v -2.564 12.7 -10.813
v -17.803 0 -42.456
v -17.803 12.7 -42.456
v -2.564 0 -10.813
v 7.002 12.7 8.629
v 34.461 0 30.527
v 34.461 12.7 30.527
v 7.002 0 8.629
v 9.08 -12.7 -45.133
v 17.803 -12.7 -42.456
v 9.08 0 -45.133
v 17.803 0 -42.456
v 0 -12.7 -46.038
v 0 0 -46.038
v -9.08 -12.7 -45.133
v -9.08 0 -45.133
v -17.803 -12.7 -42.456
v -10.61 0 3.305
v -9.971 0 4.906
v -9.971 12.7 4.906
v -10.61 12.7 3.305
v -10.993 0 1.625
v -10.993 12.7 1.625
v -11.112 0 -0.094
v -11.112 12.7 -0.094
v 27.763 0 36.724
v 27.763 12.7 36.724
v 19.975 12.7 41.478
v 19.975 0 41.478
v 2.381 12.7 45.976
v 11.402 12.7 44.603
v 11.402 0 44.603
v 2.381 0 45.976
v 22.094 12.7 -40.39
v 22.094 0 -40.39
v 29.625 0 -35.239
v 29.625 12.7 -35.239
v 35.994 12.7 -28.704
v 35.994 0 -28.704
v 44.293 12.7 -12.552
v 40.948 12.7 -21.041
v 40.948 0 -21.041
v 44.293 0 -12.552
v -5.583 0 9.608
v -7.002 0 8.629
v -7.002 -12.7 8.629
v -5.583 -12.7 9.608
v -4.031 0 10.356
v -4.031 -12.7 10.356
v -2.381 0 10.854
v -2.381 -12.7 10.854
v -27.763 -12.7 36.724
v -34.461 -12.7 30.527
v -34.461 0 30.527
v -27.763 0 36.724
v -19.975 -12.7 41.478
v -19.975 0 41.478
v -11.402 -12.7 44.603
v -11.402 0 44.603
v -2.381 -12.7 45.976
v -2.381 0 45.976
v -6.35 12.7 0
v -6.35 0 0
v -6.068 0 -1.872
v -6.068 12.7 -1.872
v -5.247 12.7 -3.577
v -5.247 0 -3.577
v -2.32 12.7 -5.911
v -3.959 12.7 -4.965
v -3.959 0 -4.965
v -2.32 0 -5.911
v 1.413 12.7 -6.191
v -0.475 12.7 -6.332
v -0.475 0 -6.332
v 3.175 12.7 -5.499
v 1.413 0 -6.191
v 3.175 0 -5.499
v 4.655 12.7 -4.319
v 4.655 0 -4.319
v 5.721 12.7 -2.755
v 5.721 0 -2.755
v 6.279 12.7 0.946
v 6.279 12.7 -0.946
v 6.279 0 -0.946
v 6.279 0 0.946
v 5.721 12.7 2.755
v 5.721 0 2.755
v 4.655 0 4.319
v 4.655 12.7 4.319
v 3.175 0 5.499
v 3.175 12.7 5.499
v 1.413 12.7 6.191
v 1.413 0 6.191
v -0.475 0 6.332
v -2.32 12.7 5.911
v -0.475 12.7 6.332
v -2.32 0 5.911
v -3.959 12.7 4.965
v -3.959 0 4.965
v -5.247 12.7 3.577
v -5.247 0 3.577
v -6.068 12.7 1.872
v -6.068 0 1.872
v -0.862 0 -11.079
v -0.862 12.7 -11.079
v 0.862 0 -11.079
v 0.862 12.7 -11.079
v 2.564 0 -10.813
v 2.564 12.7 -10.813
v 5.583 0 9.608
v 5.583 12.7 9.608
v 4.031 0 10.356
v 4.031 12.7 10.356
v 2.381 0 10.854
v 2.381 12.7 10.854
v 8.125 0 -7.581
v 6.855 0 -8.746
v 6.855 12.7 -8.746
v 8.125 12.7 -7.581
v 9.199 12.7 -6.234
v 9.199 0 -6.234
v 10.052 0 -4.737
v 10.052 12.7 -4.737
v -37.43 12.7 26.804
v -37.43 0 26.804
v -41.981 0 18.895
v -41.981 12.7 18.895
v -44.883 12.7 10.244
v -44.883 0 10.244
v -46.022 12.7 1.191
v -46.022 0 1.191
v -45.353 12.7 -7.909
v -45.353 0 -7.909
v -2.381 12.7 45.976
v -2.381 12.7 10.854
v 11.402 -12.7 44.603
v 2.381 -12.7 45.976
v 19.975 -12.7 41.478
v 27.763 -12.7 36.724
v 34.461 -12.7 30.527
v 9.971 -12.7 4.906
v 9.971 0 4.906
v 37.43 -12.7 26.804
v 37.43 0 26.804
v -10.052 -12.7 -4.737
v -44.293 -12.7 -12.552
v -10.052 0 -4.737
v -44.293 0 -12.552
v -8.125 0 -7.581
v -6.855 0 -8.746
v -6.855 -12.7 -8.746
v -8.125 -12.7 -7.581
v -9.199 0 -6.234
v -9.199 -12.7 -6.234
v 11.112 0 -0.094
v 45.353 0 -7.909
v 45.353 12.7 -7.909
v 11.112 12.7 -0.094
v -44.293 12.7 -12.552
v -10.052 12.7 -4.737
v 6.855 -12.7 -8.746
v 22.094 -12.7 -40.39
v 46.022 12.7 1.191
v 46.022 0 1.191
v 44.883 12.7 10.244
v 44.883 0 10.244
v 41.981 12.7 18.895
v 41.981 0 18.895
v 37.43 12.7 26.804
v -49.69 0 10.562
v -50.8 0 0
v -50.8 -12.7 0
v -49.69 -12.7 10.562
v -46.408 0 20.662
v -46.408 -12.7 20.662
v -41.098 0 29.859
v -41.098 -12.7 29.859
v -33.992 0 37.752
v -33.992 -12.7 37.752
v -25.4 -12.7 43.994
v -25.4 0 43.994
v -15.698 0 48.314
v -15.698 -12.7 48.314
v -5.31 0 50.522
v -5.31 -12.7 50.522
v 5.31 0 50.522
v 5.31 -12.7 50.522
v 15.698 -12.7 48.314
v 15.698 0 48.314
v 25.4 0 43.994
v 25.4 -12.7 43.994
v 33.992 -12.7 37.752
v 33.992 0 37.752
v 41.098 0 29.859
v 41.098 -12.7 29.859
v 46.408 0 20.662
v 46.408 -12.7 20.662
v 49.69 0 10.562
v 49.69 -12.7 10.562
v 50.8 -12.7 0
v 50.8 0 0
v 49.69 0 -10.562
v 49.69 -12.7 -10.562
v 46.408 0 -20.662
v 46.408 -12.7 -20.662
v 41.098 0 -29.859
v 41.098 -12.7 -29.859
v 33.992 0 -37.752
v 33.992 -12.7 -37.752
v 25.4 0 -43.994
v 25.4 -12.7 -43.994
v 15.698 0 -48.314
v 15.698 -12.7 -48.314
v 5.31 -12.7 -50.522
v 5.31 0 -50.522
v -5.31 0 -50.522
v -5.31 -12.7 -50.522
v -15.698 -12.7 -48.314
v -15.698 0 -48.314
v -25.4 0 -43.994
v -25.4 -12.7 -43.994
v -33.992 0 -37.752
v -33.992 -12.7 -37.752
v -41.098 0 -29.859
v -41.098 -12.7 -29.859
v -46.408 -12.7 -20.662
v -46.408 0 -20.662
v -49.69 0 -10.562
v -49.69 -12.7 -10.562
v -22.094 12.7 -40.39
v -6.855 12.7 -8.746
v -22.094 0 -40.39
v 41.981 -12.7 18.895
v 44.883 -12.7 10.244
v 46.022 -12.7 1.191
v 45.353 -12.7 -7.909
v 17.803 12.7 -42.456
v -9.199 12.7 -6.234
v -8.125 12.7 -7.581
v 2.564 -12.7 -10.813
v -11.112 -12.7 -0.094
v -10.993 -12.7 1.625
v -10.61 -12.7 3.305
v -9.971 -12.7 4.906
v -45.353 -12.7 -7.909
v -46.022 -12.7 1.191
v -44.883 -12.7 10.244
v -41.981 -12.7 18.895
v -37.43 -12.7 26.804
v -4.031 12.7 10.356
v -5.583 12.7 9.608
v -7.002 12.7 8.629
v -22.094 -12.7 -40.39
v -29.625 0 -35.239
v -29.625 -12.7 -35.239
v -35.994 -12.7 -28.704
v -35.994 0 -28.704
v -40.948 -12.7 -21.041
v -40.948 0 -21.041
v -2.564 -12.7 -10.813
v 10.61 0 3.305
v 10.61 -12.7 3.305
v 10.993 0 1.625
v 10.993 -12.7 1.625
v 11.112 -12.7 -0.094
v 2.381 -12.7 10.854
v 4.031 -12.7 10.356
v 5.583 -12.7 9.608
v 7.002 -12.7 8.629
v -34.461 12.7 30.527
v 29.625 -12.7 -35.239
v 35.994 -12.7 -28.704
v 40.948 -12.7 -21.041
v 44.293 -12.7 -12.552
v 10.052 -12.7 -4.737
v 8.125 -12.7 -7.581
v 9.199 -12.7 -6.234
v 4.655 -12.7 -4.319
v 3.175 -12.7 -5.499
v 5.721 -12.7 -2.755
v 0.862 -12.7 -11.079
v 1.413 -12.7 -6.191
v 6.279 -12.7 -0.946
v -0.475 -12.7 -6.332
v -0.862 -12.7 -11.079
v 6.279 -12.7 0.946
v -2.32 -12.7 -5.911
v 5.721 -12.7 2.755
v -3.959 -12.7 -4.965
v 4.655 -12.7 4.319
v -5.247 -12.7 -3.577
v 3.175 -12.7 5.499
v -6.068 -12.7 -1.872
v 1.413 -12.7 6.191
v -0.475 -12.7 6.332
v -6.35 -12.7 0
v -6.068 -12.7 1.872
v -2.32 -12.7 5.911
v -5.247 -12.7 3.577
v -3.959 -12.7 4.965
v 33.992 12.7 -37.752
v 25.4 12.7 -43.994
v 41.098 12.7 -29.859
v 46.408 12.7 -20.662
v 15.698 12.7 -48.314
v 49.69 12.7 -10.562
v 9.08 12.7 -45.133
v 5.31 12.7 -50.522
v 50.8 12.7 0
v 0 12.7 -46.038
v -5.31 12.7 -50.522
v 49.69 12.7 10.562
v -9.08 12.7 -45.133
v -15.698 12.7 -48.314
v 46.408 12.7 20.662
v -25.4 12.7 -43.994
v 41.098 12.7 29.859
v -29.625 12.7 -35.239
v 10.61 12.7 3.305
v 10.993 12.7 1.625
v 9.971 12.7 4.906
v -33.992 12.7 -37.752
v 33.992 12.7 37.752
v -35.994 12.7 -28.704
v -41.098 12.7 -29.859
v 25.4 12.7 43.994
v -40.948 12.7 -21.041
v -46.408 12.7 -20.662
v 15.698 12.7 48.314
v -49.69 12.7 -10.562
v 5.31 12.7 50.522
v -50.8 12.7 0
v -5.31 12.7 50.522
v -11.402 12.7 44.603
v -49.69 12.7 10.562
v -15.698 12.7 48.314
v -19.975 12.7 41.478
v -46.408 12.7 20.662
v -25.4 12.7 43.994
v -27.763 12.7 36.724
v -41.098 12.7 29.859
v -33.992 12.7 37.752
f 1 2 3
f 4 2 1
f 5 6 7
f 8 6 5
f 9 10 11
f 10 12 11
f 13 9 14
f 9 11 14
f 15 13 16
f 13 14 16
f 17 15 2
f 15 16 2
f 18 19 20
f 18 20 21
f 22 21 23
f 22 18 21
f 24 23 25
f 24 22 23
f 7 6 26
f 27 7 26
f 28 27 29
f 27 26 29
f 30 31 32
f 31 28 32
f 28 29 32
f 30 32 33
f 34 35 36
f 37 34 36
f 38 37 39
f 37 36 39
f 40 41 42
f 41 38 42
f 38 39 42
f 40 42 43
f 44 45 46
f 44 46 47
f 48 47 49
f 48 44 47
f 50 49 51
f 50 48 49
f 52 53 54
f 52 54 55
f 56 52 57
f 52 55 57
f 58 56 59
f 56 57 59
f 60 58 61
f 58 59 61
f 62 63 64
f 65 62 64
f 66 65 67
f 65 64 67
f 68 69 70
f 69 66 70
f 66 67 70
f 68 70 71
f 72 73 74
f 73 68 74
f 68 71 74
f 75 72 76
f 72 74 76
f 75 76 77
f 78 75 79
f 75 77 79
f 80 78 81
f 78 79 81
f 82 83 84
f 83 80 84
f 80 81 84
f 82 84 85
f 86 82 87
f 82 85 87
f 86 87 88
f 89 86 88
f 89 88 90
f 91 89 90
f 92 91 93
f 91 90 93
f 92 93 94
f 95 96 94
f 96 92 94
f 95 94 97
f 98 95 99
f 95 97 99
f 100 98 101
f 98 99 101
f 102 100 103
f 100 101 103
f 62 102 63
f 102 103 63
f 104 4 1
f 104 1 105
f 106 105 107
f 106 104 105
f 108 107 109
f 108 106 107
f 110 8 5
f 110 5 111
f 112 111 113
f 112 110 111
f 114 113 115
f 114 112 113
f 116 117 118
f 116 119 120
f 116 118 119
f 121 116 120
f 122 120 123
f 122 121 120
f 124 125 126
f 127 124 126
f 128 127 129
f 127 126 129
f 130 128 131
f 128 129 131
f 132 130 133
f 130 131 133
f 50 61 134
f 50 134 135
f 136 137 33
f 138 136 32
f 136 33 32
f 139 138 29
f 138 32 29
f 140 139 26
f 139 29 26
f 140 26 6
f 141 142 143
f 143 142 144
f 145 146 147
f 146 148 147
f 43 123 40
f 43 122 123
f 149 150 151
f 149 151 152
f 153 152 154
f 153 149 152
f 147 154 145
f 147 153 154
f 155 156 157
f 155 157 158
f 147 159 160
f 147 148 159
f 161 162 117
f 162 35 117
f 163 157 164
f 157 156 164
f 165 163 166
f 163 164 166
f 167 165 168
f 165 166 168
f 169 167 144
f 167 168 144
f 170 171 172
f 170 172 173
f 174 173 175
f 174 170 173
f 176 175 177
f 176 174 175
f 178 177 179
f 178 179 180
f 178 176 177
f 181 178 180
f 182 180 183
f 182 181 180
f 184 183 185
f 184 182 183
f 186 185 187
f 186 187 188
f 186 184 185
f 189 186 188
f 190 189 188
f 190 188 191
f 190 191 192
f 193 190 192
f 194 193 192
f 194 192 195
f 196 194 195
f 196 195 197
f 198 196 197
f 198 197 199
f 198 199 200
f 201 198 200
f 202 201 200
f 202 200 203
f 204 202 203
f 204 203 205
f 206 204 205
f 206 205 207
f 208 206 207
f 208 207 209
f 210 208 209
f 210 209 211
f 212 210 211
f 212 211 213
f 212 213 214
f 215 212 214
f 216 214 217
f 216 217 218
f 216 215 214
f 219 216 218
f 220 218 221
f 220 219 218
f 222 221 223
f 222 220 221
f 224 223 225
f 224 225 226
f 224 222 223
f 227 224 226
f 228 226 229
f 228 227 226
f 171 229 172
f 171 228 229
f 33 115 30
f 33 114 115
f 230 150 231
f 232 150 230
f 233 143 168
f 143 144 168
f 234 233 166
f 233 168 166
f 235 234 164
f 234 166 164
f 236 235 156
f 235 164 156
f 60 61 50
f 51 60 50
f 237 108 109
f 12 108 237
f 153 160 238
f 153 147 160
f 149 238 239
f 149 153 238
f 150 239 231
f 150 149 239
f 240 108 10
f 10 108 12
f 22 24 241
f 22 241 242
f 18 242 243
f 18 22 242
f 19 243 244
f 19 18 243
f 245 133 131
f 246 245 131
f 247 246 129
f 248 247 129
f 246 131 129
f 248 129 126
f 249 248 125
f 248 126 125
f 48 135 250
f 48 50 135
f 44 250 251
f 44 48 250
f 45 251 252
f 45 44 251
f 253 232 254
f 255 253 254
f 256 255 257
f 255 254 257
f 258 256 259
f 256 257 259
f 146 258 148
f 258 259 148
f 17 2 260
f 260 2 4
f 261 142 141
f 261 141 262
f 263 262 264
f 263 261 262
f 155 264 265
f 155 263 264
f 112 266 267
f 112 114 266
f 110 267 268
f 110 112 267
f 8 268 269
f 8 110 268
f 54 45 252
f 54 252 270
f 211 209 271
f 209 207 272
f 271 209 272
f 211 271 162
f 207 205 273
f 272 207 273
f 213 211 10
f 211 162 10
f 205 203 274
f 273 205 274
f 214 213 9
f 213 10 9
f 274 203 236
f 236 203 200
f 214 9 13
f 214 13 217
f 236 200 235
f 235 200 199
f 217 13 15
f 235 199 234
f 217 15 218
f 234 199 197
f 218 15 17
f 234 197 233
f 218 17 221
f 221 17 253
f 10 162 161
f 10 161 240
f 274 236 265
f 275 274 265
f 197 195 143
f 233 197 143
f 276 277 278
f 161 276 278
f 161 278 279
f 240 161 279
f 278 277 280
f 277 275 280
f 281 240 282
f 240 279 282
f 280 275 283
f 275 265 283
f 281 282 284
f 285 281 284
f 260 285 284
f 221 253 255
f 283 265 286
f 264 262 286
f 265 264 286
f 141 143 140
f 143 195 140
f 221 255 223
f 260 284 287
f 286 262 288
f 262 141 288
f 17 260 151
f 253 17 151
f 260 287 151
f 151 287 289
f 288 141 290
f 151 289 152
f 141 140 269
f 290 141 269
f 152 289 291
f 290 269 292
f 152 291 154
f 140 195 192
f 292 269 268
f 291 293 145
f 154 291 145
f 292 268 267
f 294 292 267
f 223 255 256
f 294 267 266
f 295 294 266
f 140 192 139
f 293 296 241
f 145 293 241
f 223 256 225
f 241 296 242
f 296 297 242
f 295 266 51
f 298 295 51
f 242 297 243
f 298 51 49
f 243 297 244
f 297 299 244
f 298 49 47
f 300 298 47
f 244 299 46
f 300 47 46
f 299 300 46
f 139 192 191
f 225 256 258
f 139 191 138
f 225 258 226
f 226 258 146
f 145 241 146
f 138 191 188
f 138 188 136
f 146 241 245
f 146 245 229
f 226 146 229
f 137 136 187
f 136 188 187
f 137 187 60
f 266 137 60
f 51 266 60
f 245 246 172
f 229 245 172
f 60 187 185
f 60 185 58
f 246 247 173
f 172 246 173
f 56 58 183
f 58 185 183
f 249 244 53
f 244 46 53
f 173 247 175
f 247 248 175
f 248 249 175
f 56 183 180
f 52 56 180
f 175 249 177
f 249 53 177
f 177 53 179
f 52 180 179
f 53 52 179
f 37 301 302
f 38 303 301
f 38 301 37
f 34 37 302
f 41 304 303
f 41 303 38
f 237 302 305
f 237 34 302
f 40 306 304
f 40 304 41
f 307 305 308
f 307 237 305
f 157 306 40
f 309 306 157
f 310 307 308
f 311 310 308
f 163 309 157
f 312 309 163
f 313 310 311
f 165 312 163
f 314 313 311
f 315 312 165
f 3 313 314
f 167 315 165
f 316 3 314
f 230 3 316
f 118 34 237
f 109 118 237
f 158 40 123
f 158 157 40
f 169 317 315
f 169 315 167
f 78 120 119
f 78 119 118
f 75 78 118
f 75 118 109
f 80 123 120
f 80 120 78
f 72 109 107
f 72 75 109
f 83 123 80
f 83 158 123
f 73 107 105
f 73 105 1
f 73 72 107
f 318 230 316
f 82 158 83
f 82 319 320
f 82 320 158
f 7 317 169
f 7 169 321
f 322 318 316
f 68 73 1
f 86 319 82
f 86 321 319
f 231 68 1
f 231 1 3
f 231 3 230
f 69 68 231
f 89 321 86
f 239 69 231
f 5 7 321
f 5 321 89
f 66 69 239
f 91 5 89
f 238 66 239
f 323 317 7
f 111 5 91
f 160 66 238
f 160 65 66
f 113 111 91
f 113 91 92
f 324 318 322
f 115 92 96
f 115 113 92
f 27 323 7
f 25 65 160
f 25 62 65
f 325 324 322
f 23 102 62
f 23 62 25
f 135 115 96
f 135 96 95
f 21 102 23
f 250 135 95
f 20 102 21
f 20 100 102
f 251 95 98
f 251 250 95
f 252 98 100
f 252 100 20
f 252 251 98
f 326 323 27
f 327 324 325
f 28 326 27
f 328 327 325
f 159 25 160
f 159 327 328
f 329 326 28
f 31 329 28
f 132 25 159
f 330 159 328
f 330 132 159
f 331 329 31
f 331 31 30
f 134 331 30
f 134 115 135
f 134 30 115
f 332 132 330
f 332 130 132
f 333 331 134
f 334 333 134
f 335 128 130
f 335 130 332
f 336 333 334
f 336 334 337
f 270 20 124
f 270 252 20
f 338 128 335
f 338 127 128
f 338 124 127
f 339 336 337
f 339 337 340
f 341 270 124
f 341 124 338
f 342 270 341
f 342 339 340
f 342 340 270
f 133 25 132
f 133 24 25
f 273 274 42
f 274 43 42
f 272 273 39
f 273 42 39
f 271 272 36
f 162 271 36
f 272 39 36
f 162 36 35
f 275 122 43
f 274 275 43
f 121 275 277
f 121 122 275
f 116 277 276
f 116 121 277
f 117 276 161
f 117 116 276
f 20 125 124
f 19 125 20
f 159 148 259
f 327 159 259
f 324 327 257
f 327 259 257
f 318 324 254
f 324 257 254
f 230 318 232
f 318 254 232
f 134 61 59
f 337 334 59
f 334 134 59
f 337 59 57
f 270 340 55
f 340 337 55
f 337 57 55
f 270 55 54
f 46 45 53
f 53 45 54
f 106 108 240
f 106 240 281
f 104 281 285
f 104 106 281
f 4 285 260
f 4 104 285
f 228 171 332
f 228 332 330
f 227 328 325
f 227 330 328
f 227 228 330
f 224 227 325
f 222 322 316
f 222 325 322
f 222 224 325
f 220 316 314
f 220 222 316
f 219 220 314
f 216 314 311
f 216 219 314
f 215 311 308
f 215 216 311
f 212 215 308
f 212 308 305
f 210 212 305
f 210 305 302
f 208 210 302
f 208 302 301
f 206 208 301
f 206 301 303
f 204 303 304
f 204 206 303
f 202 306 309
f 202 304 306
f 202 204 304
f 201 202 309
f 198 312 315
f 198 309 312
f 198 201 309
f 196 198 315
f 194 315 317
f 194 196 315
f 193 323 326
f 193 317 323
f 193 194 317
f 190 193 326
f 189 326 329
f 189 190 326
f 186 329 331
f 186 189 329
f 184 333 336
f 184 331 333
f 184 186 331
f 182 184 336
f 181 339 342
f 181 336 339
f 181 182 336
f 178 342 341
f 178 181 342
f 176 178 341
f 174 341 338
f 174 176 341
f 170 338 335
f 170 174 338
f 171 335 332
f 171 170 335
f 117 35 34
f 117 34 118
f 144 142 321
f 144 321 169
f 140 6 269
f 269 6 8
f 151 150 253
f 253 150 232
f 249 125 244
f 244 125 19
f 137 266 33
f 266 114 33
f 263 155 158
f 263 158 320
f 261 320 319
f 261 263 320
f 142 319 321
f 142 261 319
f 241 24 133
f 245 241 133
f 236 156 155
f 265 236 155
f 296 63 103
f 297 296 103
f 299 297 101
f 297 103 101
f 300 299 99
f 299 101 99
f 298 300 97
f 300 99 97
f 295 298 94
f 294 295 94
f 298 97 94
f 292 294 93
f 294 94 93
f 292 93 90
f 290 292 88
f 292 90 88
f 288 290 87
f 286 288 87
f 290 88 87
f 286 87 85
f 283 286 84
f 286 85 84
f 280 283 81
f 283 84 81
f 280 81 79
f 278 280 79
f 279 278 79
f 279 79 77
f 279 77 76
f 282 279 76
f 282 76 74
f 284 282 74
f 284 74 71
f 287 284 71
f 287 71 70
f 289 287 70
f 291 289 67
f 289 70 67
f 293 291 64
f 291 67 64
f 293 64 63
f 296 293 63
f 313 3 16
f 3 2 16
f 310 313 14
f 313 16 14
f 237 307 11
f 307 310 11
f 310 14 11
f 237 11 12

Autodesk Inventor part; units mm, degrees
ref_plane "YZ Plane" through (0, 0, 0) normal (1, 0, 0) x (0, 1, 0)
ref_plane "XZ Plane" through (0, 0, 0) normal (0, 1, 0) x (-1, 0, 0)
ref_plane "XY Plane" through (0, 0, 0) normal (0, 0, 1) x (1, 0, 0)
sketch "Sketch1" plane through (0, 0, 0) normal (0, 1, 0) x (-1, 0, 0)
  circle A0 centre (0, 0) radius 6.35
  circle A1 centre (0, 0) radius 50.8
  arc A2 (-17.8028, -42.456) -> (17.8028, -42.456) centre (0, 0) ccw
  line L0 (0, 0) -> (0, -50.8) construction
  arc A3 (-2.5641, -10.8126) -> (2.5641, -10.8126) centre (0, 0) ccw
  line L1 (17.8028, -42.456) -> (2.5641, -10.8126)
  line L2 (-2.5641, -10.8126) -> (-17.8028, -42.456)
  line L3 (6.855, -8.7463) -> (22.0936, -40.3896)
  arc A4 (22.0936, -40.3896) -> (44.2933, -12.5521) centre (0, 0) ccw
  line L4 (44.2933, -12.5521) -> (10.0523, -4.7369)
  arc A5 (6.855, -8.7463) -> (10.0523, -4.7369) centre (0, 0) ccw
  line L5 (11.1121, -0.0938) -> (45.353, -7.909)
  arc A6 (45.353, -7.909) -> (37.4301, 26.8038) centre (0, 0) ccw
  line L6 (37.4301, 26.8038) -> (9.971, 4.9059)
  arc A7 (11.1121, -0.0938) -> (9.971, 4.9059) centre (0, 0) ccw
  line L7 (7.0016, 8.6293) -> (34.4607, 30.5272)
  arc A8 (34.4607, 30.5272) -> (2.3812, 45.9759) centre (0, 0) ccw
  line L8 (2.3812, 45.9759) -> (2.3812, 10.8544)
  arc A9 (7.0016, 8.6293) -> (2.3812, 10.8544) centre (0, 0) ccw
  line L9 (-2.3813, 10.8544) -> (-2.3813, 45.9759)
  arc A10 (-2.3813, 45.9759) -> (-34.4607, 30.5272) centre (0, 0) ccw
  line L10 (-34.4607, 30.5272) -> (-7.0016, 8.6293)
  arc A11 (-2.3813, 10.8544) -> (-7.0016, 8.6293) centre (0, 0) ccw
  line L11 (-9.971, 4.9059) -> (-37.4301, 26.8038)
  arc A12 (-37.4301, 26.8038) -> (-45.353, -7.909) centre (0, 0) ccw
  line L12 (-45.353, -7.909) -> (-11.1121, -0.0938)
  arc A13 (-9.971, 4.9059) -> (-11.1121, -0.0938) centre (0, 0) ccw
  line L13 (-10.0523, -4.7369) -> (-44.2933, -12.5521)
  arc A14 (-44.2933, -12.5521) -> (-22.0936, -40.3896) centre (0, 0) ccw
  line L14 (-22.0936, -40.3896) -> (-6.855, -8.7463)
  arc A15 (-10.0523, -4.7369) -> (-6.855, -8.7463) centre (0, 0) ccw
  point P0 (0, -46.0375)
  point P1 (0, -11.1125)
  point P2 (35.9936, -28.7039)
  point P3 (8.6881, -6.9285)
  point P4 (44.8832, 10.2443)
  point P5 (10.8339, 2.4728)
  point P6 (19.9749, 41.4784)
  point P7 (4.8215, 10.012)
  point P8 (-19.9749, 41.4784)
  point P9 (-4.8215, 10.012)
  point P10 (-44.8832, 10.2443)
  point P11 (-10.8339, 2.4728)
  point P12 (-35.9936, -28.7039)
  point P13 (-8.6881, -6.9285)
  dimension "d1" = 101.6
  dimension "d0" = 12.7
  dimension "d4" = 4.7625
  dimension "d5" = 4.7625
  dimension "d8" = 360
  dimension "d10" = 4.7625
extrude "Extrusion1" add sketch "Sketch1" along normal mid plane 25.4
equation "\"d5\" = d4"
equation "\"d10\" = d4"
properties part number "intake roller" material "Rubber"
